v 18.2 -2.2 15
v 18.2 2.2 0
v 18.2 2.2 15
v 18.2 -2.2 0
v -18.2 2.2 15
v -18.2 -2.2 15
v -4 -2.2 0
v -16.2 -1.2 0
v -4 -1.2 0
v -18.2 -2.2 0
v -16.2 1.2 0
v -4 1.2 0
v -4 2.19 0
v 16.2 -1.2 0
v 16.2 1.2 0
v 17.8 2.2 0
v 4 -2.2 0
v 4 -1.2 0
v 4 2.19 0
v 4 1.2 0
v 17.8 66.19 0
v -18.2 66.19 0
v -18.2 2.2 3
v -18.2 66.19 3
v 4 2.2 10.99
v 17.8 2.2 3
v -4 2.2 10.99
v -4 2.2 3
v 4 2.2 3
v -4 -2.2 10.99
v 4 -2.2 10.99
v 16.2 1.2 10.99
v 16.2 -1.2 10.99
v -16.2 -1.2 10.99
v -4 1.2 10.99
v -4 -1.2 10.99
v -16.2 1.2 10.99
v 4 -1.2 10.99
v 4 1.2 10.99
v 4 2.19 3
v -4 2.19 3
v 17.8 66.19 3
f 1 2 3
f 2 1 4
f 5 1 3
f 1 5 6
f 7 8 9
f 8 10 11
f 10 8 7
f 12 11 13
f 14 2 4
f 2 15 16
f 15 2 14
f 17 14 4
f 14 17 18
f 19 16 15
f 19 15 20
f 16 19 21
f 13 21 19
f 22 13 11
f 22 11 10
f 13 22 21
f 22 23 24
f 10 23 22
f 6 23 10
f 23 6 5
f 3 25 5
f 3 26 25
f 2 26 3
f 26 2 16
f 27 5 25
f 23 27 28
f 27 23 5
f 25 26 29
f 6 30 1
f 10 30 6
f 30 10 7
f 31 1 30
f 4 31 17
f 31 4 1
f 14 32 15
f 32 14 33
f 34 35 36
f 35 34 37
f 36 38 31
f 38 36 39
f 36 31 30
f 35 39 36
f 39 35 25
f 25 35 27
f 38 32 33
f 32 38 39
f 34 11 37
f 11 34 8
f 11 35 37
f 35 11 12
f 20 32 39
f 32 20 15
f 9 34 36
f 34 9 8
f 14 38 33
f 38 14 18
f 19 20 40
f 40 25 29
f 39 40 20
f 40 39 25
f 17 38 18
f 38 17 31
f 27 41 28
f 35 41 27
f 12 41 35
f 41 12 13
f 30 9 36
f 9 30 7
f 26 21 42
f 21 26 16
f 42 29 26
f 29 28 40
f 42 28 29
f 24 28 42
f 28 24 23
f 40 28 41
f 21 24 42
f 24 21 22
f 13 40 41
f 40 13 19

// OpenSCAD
eps = 0.01;
fit_eps = 0.2;

diam=8;
width=4;
flange_width=2;
horn_length=32;


bottom_plate = [horn_length+4,2*horn_length,3];
bottom_width=bottom_plate[2];
inner = [horn_length+2*fit_eps,flange_width+2*fit_eps,diam+bottom_width];
outer = inner + [4,2,4];

difference(){
	translate([-outer[0]/2,-outer[1]/2,0]){cube(outer);}
	translate([-inner[0]/2,-inner[1]/2,-eps]){cube(inner);}
	translate([-diam/2,-diam/2,-eps]){cube([diam,20,diam+bottom_width]);}
}
translate([-outer[0]/2, outer[1]/2-eps,0]){cube(bottom_plate);}
